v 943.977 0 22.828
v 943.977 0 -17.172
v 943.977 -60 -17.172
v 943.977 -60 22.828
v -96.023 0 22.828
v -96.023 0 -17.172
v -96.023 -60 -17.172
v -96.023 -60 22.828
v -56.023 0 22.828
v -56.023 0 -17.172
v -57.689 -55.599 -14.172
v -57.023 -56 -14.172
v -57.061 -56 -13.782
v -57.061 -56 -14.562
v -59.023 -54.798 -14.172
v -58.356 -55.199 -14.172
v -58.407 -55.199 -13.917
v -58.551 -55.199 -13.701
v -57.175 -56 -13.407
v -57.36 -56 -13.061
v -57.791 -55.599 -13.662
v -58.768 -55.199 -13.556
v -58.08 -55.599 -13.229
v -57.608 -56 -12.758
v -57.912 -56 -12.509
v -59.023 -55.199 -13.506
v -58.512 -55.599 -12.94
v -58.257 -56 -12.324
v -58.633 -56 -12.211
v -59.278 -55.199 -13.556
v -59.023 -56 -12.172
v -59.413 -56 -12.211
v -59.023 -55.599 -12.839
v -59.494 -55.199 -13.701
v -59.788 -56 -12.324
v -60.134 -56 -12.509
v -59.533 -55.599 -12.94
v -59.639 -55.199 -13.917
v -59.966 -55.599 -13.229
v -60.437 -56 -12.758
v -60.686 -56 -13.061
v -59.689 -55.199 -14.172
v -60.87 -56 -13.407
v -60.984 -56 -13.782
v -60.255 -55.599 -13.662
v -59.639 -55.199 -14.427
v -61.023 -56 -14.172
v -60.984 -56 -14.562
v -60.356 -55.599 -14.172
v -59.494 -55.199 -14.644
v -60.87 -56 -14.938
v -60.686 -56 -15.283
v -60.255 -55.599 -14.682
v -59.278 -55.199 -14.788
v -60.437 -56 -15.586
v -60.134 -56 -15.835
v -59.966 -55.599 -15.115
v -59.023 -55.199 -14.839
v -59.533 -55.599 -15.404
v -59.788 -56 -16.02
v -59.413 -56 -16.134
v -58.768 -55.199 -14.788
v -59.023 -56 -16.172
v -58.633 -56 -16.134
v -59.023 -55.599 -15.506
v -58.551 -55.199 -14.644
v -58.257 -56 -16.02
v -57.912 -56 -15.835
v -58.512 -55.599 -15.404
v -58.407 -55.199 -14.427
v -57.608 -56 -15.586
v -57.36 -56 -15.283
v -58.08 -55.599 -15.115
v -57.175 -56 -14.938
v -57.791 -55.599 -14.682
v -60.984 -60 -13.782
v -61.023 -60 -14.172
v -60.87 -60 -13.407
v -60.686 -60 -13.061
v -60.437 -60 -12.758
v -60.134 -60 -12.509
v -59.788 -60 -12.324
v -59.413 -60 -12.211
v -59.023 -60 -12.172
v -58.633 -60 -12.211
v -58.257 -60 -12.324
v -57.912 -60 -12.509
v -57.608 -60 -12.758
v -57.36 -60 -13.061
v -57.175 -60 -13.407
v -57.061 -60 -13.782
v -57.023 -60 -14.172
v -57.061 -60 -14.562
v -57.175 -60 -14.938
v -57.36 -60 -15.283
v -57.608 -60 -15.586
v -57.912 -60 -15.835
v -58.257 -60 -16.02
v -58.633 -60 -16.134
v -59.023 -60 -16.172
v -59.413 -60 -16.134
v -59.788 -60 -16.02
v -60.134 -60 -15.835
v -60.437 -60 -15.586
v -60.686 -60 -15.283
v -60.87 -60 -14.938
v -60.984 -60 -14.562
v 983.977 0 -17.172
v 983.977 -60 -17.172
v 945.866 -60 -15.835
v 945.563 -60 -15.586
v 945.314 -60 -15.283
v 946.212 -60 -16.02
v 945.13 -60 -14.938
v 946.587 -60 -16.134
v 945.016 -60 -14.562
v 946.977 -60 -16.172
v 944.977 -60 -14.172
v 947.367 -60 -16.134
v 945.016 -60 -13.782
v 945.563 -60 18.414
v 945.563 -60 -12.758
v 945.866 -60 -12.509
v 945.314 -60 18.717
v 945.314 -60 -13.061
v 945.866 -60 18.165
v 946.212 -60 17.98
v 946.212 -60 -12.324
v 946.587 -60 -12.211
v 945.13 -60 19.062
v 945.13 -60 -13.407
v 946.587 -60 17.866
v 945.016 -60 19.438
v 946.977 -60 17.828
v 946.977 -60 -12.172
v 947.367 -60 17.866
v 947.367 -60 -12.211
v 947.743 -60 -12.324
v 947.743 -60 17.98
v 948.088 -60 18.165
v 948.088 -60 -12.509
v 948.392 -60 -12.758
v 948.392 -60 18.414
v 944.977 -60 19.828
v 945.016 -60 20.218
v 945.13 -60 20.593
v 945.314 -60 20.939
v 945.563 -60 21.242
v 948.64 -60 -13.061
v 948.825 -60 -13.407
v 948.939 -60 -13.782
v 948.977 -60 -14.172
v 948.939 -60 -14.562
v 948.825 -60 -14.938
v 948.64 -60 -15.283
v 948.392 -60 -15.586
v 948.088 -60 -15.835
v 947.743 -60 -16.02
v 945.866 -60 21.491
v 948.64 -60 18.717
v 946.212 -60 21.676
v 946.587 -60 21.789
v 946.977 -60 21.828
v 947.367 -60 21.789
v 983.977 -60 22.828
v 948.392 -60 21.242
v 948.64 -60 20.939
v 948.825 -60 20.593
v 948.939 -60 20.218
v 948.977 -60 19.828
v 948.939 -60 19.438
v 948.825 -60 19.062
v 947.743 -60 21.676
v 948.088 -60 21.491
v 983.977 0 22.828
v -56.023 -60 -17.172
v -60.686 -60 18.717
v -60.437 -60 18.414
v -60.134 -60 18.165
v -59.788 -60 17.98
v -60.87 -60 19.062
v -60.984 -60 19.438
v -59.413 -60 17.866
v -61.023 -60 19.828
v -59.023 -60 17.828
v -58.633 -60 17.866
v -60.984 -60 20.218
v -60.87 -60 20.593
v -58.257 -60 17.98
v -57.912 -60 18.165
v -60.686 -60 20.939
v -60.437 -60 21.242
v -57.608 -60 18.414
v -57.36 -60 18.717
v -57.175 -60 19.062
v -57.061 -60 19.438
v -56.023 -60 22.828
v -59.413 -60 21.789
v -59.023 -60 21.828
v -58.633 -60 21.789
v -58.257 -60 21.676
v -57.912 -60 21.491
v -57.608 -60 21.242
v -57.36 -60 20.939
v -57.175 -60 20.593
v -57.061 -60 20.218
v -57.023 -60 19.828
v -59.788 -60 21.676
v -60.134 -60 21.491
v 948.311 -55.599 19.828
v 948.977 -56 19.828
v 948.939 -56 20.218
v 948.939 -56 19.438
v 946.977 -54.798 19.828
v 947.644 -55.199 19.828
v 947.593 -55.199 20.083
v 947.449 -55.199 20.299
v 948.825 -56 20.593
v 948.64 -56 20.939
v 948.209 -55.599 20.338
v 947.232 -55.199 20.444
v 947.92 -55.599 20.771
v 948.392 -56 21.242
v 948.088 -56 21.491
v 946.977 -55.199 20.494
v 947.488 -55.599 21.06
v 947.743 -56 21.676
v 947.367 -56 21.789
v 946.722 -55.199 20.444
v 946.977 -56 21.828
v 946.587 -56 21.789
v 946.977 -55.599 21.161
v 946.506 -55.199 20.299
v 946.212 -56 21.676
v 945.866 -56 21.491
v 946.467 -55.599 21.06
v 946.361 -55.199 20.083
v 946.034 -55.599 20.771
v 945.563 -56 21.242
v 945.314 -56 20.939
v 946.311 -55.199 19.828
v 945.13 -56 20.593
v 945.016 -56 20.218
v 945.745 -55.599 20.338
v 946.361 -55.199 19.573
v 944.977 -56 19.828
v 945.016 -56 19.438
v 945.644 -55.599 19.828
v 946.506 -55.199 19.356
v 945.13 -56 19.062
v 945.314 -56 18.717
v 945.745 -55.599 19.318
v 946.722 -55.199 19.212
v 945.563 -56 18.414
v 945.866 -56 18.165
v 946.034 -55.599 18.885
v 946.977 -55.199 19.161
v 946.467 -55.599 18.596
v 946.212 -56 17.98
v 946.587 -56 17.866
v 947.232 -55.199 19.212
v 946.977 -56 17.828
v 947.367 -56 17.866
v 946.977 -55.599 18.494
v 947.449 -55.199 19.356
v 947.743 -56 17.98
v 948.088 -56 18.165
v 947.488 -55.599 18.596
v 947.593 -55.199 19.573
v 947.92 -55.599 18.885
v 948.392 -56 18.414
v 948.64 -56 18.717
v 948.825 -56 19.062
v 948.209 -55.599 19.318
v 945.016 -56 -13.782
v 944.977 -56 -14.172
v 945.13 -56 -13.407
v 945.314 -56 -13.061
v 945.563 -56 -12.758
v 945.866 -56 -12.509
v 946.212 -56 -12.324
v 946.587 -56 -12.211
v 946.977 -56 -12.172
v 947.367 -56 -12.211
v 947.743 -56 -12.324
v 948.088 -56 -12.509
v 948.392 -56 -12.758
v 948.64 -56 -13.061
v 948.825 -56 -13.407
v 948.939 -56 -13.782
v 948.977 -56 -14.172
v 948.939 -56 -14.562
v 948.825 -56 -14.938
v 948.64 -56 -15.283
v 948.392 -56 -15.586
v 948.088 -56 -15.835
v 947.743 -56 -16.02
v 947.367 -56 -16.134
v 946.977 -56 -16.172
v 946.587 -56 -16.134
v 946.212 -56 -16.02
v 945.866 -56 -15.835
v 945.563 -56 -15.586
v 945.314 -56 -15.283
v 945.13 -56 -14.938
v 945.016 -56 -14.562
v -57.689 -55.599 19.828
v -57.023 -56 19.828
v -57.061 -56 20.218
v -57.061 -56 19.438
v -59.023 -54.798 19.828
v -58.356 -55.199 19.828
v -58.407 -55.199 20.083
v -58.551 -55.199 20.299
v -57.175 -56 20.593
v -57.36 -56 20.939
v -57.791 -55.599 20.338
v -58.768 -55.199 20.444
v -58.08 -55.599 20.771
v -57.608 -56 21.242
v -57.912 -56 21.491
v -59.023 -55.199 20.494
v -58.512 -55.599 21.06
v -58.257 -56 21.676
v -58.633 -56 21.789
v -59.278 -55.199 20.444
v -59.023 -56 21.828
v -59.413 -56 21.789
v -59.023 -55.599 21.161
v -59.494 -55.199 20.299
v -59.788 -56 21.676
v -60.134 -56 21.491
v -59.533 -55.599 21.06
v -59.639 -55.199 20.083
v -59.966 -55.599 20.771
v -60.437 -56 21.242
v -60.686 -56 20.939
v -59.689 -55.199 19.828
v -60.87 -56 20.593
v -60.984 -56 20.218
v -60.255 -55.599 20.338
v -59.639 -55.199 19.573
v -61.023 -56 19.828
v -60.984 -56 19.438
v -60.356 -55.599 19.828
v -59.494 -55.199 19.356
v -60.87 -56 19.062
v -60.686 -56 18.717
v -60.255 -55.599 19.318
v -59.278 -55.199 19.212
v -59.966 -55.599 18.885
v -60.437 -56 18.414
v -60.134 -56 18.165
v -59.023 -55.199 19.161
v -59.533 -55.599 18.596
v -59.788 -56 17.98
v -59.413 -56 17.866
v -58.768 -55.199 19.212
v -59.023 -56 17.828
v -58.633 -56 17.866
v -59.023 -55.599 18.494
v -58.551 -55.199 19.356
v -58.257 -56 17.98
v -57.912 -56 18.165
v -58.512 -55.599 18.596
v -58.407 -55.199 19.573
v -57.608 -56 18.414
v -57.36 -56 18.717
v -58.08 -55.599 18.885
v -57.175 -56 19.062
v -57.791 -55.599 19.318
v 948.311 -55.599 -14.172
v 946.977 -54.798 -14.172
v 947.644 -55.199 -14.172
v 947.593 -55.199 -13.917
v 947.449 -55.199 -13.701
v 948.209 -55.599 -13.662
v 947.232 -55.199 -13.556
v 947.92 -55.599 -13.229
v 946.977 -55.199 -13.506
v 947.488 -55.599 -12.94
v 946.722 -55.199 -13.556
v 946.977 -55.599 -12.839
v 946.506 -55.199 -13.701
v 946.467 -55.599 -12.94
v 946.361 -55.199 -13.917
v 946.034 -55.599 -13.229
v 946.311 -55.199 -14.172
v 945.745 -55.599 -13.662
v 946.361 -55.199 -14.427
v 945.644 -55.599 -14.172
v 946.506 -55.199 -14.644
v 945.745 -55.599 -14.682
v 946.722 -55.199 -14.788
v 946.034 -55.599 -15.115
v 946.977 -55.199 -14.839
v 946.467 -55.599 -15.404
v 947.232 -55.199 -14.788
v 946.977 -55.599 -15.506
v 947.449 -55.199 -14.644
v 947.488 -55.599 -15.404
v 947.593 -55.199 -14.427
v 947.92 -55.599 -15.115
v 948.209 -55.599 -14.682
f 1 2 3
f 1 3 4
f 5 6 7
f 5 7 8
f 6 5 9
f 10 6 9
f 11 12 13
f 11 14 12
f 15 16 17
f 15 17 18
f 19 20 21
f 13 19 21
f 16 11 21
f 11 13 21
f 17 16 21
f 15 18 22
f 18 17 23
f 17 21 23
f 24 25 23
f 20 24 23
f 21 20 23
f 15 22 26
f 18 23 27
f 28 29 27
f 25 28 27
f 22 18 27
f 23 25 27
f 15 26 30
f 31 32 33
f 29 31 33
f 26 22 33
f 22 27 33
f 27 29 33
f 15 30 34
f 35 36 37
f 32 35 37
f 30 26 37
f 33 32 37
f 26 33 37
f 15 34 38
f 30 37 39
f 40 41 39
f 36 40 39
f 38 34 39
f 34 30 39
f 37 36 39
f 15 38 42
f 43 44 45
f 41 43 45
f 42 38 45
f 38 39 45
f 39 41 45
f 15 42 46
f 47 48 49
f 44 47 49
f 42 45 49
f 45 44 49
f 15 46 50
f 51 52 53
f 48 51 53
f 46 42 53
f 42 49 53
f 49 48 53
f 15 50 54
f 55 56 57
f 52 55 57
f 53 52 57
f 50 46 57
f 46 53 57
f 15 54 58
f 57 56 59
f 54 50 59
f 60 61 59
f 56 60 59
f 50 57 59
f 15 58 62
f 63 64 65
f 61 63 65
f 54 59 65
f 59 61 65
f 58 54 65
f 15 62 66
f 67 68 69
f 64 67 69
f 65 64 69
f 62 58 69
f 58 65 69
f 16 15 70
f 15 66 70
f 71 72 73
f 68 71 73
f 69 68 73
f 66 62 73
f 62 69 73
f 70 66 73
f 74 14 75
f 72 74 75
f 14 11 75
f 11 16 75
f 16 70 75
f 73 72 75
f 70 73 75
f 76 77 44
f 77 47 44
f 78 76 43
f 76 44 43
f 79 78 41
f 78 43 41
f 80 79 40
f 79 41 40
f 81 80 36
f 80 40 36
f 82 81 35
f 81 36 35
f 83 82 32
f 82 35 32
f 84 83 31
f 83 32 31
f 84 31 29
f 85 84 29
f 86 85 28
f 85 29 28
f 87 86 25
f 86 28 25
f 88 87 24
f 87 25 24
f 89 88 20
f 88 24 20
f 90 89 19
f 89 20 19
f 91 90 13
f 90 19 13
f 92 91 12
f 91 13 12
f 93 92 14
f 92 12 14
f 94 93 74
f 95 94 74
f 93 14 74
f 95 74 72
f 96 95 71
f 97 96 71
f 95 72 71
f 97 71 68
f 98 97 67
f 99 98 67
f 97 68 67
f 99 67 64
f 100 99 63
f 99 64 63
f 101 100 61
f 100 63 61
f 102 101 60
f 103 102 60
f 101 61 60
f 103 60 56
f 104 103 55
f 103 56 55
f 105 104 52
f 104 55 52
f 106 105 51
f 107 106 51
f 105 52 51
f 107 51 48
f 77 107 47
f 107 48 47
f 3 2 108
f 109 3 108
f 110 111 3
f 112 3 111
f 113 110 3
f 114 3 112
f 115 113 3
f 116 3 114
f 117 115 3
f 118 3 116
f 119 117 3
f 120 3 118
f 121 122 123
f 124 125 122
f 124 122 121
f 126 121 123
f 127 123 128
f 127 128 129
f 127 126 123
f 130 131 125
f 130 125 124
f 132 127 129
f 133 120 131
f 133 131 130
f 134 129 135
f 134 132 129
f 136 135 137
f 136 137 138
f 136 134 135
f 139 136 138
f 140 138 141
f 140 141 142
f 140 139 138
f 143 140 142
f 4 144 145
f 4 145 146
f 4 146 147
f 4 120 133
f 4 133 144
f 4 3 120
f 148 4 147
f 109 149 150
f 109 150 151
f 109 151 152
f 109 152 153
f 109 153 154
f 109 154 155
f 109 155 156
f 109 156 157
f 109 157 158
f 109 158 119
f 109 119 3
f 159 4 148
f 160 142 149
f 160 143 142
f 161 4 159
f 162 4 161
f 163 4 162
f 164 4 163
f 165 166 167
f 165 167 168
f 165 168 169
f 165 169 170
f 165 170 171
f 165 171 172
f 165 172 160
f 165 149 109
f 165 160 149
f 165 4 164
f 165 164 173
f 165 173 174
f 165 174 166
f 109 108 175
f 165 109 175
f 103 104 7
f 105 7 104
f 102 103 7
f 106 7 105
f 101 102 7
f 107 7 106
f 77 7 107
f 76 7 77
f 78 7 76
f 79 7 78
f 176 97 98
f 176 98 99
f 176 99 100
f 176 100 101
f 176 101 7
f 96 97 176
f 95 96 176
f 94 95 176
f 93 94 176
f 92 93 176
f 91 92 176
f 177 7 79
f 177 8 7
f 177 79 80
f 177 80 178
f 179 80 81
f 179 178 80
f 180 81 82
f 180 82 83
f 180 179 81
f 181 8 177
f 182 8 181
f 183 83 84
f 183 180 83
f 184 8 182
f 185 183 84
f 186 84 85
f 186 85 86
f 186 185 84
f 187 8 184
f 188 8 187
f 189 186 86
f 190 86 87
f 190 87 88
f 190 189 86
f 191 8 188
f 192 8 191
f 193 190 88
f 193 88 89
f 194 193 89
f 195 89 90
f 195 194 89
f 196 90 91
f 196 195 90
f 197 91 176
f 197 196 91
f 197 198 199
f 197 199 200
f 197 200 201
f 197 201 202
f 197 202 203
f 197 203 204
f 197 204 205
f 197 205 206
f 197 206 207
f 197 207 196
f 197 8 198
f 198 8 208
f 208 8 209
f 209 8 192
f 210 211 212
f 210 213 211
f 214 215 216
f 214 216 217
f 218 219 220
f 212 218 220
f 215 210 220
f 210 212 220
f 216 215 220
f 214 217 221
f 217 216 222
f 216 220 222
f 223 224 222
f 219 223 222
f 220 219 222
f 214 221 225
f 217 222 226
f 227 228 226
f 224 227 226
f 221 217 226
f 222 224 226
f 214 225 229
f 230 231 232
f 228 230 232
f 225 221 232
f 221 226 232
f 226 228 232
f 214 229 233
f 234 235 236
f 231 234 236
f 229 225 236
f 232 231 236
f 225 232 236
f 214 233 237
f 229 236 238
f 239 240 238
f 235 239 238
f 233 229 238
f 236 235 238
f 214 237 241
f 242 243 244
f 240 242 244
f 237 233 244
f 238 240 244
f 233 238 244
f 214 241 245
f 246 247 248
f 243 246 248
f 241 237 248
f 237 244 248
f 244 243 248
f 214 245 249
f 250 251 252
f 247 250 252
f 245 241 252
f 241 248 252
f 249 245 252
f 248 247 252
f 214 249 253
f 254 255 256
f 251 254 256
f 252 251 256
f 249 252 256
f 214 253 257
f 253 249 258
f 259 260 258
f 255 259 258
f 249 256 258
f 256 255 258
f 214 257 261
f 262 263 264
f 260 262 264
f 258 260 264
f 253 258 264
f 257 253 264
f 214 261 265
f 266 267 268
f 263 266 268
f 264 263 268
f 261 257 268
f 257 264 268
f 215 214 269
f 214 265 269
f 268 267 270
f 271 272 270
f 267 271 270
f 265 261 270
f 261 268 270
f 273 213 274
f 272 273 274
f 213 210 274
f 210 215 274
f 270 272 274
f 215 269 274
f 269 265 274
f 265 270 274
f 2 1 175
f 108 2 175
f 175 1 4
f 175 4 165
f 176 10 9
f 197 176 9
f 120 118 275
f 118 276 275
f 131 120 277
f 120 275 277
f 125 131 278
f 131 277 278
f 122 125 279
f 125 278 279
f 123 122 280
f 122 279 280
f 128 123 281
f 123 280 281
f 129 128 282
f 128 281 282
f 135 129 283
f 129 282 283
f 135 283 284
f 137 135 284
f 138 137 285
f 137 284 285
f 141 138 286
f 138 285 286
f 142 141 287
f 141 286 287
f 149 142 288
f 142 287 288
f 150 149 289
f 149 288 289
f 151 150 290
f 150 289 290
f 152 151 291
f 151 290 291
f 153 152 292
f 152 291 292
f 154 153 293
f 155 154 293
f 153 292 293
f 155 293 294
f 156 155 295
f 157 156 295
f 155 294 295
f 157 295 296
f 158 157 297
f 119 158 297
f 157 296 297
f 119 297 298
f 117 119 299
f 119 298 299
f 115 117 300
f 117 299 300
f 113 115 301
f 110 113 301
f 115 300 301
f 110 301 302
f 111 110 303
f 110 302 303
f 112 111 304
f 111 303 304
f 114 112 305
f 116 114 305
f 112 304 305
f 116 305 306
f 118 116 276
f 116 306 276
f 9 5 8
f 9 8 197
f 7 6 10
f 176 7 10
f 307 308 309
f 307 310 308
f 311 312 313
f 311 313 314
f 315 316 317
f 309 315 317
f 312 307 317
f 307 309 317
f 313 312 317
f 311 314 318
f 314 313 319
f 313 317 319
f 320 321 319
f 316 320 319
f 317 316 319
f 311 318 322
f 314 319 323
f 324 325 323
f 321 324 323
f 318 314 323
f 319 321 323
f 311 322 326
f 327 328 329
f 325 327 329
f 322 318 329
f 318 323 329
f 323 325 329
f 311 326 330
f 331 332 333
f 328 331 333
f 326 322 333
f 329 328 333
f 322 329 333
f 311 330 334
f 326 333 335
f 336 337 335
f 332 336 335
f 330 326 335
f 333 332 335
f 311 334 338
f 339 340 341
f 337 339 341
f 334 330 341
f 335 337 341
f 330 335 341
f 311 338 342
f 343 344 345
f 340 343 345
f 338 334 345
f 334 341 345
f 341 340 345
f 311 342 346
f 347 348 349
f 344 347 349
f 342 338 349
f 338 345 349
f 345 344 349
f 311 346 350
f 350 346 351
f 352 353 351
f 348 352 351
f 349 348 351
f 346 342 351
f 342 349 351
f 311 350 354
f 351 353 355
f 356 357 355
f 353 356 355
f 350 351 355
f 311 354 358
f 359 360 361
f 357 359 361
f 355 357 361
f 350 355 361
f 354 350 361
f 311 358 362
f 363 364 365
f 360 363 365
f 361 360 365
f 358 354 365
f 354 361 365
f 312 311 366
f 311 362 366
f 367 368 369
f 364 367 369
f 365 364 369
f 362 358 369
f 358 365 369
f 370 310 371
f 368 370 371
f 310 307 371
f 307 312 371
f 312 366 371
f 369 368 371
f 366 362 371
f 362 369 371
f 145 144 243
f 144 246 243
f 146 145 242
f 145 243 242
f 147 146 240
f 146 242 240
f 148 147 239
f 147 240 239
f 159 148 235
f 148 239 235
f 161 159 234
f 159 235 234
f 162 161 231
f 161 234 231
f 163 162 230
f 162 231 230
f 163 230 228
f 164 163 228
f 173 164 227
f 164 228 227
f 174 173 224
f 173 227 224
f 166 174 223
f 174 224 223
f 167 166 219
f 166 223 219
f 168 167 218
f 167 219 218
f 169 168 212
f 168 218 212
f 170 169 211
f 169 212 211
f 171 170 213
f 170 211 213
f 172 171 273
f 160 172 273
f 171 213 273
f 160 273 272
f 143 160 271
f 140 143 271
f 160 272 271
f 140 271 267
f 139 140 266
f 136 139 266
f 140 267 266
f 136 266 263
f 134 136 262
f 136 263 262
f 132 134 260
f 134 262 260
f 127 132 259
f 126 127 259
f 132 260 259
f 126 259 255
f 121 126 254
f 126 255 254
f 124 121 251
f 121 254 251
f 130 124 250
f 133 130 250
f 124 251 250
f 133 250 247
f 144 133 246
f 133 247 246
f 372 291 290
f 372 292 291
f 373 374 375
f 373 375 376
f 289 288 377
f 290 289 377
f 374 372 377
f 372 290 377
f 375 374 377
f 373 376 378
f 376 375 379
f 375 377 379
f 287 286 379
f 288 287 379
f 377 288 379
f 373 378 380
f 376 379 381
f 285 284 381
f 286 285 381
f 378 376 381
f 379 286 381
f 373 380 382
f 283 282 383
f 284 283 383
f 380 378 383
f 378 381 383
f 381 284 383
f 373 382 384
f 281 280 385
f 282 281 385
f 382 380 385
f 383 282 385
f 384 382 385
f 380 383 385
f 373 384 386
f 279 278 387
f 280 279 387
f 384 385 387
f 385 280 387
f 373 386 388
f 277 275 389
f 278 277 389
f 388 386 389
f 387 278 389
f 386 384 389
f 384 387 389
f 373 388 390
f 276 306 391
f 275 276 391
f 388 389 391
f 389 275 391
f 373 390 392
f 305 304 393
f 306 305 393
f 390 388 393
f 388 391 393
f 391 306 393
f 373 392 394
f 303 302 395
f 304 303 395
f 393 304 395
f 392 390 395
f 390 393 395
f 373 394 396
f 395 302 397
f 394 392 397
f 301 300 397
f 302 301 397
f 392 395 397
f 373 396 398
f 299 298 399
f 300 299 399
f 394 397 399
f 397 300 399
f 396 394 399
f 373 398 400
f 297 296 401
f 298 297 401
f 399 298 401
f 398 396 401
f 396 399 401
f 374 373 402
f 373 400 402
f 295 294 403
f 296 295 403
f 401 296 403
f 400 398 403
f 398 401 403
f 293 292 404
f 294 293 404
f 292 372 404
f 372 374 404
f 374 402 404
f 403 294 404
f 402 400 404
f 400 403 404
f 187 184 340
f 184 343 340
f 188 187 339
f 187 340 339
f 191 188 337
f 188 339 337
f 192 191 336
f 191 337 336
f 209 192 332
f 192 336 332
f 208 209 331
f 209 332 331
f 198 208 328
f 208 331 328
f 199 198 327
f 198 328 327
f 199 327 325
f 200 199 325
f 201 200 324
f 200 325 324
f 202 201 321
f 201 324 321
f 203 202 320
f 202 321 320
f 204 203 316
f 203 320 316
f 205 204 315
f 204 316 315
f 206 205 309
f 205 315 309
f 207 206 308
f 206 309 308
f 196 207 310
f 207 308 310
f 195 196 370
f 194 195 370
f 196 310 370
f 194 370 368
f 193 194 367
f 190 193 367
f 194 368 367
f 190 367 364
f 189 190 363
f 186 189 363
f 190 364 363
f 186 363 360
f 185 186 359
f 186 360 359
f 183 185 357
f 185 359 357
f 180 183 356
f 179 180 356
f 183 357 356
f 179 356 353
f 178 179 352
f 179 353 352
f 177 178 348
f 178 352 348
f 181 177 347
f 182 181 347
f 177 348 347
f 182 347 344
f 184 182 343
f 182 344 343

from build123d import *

# Parameters (mm, degrees)
F0_W     = 40
F0_H     = 40
F1_DEPTH = 60
F3_D     = 4
F3_DEPTH = 4
F3_TIP   = 1.2017212381
F5_D     = 4
F5_DEPTH = 4
F5_TIP   = 1.2017212381


with BuildPart() as f1:
    # F0 (on Front) → F1 (new body)
    with BuildSketch(Plane.XZ):
        with Locations((-76.0227025953, 2.8278025426)):
            Rectangle(F0_W, F0_H)
    extrude(amount=F1_DEPTH)

    # F5
    with Locations(Plane.XZ.offset(60)):
        with Locations((-59.0227025953, 19.8278025426), (-59.0227025953, -14.1721974574)):
            Hole(F5_D / 2, depth=F5_DEPTH)
            with Locations((0, 0, -(F5_DEPTH + F5_TIP / 2))):  # 118° drill point
                Cone(0, F5_D / 2, F5_TIP, mode=Mode.SUBTRACT)


with BuildPart() as f1b:
    # F0 (on Front) → F1, piece 2 (new body)
    with BuildSketch(Plane.XZ):
        with Locations((963.9772974047, 2.8278025426)):
            Rectangle(F0_W, F0_H)
    extrude(amount=F1_DEPTH)

    # F3
    with Locations(Plane.XZ.offset(60)):
        with Locations((946.9772974047, 19.8278025426), (946.9772974047, -14.1721974574)):
            Hole(F3_D / 2, depth=F3_DEPTH)
            with Locations((0, 0, -(F3_DEPTH + F3_TIP / 2))):  # 118° drill point
                Cone(0, F3_D / 2, F3_TIP, mode=Mode.SUBTRACT)


solid = Compound([f1.part, f1b.part])
